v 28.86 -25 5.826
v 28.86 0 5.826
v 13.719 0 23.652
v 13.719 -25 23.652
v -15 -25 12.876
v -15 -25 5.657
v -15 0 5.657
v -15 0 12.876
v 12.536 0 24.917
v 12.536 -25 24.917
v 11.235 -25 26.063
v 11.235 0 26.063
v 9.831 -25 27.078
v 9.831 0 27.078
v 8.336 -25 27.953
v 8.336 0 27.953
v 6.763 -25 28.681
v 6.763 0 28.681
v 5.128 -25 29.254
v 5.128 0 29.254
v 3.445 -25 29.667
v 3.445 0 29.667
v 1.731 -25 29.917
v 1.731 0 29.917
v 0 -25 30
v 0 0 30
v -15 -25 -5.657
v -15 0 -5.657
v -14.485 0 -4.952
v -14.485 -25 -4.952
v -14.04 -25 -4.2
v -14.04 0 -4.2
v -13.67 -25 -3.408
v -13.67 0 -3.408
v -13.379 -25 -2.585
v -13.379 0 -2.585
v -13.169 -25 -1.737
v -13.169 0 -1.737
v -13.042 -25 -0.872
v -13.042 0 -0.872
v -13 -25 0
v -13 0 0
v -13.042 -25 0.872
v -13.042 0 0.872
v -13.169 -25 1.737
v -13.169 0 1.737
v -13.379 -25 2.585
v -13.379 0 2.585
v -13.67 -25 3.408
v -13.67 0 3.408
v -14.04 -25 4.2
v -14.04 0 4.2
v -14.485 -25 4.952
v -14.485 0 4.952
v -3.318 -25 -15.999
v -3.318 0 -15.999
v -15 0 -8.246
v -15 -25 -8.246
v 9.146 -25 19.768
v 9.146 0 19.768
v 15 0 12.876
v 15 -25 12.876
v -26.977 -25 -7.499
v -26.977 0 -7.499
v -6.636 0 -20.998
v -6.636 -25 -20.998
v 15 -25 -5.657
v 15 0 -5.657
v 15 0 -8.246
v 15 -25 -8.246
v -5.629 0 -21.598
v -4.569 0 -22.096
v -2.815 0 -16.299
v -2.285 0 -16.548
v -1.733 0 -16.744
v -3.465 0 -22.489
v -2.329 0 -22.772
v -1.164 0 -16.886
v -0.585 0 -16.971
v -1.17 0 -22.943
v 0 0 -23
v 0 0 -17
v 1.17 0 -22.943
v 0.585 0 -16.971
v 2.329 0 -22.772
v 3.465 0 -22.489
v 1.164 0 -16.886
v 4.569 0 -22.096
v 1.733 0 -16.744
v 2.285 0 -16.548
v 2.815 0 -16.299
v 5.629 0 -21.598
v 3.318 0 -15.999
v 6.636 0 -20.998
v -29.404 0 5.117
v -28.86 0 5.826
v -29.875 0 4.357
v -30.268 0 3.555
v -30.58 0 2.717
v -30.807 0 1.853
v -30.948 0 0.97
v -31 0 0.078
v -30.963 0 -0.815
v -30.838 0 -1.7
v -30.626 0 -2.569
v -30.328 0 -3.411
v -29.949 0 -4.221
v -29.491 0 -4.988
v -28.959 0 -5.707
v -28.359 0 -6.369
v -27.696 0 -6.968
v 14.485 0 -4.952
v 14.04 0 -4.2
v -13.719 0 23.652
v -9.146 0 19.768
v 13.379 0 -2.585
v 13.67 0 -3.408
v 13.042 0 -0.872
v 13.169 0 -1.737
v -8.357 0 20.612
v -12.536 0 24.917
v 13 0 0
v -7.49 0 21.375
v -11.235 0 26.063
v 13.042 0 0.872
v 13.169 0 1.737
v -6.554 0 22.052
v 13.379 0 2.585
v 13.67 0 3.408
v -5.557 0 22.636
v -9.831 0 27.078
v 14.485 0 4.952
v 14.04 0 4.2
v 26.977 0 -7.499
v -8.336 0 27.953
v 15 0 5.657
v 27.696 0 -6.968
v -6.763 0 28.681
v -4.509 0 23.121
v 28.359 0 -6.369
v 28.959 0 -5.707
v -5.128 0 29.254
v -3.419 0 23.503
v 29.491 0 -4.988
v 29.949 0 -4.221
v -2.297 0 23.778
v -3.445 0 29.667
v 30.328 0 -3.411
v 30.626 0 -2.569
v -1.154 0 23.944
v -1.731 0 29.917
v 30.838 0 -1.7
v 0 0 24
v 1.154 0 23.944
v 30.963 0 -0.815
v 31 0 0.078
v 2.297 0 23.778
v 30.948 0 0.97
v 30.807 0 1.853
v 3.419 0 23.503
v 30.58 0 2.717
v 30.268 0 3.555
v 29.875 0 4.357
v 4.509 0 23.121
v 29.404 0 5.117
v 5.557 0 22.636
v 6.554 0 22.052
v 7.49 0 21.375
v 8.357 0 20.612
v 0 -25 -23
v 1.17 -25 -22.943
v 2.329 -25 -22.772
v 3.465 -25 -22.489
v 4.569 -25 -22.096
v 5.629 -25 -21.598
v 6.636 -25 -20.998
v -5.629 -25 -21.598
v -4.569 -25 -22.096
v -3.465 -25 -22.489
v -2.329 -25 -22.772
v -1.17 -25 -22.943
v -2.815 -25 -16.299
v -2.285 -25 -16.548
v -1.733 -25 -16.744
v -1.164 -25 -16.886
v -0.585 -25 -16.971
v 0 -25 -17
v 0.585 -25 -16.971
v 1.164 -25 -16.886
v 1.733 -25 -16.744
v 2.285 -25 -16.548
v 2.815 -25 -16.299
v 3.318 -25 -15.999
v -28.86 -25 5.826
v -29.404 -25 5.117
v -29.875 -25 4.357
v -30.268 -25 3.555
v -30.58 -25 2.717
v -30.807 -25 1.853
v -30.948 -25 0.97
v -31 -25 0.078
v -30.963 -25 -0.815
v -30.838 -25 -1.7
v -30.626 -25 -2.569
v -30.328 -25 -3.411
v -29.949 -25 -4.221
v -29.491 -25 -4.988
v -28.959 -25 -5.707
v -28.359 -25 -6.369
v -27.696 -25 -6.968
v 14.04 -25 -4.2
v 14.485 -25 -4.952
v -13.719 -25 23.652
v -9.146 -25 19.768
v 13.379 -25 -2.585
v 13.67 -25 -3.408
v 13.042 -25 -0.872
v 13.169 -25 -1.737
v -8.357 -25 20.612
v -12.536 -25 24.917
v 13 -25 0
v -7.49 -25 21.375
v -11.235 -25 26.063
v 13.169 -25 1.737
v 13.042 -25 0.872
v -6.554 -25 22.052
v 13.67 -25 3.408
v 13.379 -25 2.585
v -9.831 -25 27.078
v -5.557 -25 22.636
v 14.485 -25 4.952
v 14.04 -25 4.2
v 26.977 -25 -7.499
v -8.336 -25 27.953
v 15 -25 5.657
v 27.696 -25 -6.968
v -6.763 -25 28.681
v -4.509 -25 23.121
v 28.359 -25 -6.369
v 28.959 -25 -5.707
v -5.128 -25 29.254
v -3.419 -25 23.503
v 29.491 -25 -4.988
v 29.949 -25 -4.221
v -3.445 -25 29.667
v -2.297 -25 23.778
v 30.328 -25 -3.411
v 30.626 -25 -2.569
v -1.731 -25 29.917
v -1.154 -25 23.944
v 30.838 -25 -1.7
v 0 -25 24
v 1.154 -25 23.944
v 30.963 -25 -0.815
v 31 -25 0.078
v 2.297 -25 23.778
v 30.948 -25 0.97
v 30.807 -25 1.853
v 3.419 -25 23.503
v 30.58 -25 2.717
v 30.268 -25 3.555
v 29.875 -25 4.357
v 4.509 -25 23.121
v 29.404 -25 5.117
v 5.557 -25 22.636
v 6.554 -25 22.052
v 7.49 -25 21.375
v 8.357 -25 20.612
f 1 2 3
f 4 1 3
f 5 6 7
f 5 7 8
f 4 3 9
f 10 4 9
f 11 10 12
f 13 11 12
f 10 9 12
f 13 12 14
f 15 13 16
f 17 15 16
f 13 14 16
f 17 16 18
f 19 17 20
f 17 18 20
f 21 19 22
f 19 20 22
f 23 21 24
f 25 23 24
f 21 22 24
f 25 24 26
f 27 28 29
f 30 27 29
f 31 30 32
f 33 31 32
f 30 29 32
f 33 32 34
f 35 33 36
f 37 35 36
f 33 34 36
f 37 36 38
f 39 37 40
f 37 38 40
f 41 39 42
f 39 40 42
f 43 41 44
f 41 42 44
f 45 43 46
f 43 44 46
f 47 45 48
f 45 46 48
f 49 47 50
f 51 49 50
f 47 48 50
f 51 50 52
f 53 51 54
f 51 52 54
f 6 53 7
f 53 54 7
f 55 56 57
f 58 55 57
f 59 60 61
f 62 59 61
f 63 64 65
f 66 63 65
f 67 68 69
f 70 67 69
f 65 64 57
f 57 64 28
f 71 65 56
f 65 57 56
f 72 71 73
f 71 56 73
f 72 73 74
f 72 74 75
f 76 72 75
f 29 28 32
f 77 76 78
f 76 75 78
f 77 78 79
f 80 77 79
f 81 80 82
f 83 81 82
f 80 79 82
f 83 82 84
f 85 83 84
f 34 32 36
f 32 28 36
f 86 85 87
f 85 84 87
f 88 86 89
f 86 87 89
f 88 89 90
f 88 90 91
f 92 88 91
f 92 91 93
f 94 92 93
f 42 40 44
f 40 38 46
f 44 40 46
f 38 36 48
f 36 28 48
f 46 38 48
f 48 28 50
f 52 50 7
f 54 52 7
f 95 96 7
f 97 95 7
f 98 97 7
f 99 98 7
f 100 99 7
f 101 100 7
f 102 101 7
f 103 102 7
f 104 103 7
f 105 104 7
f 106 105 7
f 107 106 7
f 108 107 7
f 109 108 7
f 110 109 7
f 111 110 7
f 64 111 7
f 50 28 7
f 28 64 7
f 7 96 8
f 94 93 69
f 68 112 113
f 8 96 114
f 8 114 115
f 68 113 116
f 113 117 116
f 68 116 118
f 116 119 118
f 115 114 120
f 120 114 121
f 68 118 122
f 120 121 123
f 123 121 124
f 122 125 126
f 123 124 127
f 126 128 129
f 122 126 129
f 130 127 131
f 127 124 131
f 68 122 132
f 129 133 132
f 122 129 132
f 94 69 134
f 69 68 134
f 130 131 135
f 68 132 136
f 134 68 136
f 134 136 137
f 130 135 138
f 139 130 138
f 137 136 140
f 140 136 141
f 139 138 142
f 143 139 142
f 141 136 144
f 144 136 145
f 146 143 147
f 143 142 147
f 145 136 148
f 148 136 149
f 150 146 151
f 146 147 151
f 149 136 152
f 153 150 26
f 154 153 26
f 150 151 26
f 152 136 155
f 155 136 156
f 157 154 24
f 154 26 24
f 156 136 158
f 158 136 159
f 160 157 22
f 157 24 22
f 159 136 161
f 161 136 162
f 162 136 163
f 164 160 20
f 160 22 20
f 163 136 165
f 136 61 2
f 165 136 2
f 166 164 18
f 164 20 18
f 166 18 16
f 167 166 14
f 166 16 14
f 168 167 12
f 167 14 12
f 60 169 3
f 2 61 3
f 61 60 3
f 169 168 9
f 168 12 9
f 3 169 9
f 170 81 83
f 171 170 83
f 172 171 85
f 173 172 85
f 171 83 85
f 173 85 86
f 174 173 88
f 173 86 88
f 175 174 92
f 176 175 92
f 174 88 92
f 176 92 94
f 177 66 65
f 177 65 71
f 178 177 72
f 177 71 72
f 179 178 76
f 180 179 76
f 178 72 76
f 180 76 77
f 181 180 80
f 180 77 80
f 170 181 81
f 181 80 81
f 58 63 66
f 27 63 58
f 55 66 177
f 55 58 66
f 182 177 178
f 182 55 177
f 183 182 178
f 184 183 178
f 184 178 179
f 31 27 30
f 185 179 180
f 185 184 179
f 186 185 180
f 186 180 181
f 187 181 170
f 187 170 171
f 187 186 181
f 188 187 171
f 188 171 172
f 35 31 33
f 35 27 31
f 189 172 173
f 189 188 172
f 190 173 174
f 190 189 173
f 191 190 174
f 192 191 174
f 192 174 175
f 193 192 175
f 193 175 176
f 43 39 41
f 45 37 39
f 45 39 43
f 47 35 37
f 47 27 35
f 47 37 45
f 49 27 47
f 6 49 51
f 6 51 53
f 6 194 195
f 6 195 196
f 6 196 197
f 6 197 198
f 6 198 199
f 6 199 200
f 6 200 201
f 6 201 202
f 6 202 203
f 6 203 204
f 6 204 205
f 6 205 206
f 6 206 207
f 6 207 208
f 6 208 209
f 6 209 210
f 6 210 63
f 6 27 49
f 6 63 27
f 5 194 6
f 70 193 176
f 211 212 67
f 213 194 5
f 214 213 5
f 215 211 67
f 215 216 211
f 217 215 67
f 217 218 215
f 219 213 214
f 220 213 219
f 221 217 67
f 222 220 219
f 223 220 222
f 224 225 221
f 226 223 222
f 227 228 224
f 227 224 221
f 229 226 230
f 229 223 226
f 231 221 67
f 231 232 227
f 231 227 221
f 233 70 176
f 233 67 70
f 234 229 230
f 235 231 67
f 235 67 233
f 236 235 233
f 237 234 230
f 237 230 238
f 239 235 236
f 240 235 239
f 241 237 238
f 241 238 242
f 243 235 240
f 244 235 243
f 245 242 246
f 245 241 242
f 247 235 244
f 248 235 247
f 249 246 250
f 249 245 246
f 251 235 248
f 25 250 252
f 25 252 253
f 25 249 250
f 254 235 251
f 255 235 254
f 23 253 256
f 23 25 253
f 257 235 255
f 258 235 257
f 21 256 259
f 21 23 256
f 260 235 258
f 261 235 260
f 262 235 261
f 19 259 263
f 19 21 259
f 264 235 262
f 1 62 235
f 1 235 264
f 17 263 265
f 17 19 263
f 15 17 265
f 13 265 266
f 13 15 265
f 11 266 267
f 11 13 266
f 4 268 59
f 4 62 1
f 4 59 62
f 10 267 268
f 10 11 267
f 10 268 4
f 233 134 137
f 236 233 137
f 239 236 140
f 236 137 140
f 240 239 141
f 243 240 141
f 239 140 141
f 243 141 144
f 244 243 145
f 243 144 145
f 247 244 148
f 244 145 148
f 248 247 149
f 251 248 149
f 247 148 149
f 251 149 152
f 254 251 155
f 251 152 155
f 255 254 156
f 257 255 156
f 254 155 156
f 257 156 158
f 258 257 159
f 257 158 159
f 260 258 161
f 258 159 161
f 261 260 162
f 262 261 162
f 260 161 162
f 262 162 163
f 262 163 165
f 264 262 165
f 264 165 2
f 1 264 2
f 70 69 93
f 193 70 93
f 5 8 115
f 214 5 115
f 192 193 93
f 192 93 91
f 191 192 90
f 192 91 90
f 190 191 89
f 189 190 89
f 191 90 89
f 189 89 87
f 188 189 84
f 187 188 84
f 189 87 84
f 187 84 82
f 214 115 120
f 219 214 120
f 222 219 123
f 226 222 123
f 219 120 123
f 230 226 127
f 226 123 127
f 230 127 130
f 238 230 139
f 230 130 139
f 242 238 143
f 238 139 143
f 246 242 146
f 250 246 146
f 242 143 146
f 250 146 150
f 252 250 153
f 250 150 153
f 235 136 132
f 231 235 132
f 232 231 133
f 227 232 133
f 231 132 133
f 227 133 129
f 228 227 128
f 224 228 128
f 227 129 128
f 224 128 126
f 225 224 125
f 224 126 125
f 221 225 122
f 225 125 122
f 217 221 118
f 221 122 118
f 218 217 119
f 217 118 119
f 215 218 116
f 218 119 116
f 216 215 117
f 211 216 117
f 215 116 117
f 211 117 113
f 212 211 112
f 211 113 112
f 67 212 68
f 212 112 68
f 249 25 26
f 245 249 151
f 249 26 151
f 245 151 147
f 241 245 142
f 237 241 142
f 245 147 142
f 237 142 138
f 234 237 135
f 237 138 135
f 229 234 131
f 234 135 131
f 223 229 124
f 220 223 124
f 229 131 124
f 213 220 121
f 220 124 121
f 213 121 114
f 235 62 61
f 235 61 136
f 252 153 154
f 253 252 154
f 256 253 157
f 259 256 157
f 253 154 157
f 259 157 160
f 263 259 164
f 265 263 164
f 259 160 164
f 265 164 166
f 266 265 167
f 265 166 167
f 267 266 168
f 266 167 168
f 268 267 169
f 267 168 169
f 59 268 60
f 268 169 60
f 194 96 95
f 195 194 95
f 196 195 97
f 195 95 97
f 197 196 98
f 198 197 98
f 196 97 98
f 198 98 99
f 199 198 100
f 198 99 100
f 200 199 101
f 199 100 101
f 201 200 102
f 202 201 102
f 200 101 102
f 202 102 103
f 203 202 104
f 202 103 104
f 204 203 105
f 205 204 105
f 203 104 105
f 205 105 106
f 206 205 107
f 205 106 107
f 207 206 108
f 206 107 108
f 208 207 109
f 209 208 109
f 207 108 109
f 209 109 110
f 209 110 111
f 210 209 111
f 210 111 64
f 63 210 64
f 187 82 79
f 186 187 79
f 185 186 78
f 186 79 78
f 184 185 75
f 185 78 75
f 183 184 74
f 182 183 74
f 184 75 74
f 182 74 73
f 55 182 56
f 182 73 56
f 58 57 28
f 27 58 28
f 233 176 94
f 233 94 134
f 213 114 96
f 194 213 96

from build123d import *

# Parameters (mm, degrees)
F1_DEPTH = 25


with BuildPart() as f1:
    # F0 (on Front) → F1 (new body)
    with BuildSketch(Plane.XZ):
        with BuildLine():
            Line((28.859725, 5.826163), (13.71945, 23.652325))
            ThreePointArc((13.71945, 23.652325), (7.558378, 28.336185), (0, 30))
            ThreePointArc((0, 30), (-7.558378, 28.336185), (-13.71945, 23.652325))
            Line((-13.71945, 23.652325), (-28.859725, 5.826163))
            ThreePointArc((-28.859725, 5.826163), (-30.911458, -1.259331), (-26.976691, -7.498836))
            Line((-26.976691, -7.498836), (-6.635588, -20.998449))
            ThreePointArc((-6.635588, -20.998449), (-3.465445, -22.48872), (0, -23))
            ThreePointArc((0, -23), (3.465445, -22.48872), (6.635588, -20.998449))
            Line((6.635588, -20.998449), (26.976691, -7.498836))
            ThreePointArc((26.976691, -7.498836), (30.911458, -1.259331), (28.859725, 5.826163))
        make_face()
        with BuildLine():
            Line((15, 12.87607), (15, 5.656854))
            ThreePointArc((15, 5.656854), (13, 0), (15, -5.656854))
            Line((15, -5.656854), (15, -8.246191))
            Line((15, -8.246191), (3.317794, -15.999224))
            ThreePointArc((3.317794, -15.999224), (1.732722, -16.74436), (0, -17))
            ThreePointArc((0, -17), (-1.732722, -16.74436), (-3.317794, -15.999224))
            Line((-3.317794, -15.999224), (-15, -8.246191))
            Line((-15, -8.246191), (-15, -5.656854))
            ThreePointArc((-15, -5.656854), (-13, 0), (-15, 5.656854))
            Line((-15, 5.656854), (-15, 12.87607))
            Line((-15, 12.87607), (-9.1463, 19.768217))
            ThreePointArc((-9.1463, 19.768217), (-5.038918, 22.89079), (0, 24))
            ThreePointArc((0, 24), (5.038918, 22.89079), (9.1463, 19.768217))
            Line((9.1463, 19.768217), (15, 12.87607))
        make_face(mode=Mode.SUBTRACT)
    extrude(amount=F1_DEPTH)


solid = f1.part
